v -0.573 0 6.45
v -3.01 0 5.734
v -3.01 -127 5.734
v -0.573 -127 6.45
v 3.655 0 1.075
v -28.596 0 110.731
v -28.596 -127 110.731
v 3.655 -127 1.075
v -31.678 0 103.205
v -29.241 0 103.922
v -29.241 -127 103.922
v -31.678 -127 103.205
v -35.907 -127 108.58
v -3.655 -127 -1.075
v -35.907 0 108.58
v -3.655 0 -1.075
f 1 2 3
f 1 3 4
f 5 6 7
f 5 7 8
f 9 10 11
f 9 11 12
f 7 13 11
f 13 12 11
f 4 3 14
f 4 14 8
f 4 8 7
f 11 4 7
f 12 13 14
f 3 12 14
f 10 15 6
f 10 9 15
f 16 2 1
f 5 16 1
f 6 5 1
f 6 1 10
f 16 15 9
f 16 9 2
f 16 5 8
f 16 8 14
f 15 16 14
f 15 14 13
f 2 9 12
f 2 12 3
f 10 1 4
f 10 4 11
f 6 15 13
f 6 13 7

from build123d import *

# Parameters (mm, degrees)
BOSS_EXTRUDE1_DEPTH = 127


with BuildPart() as part:
    # Sketch5 → Boss-Extrude1 (new body)
    with BuildSketch(Plane(origin=(0, 0, 0), x_dir=(1, 0, 0), z_dir=(0, 1, 0))):
        Polygon((-35.906793393, -108.580423135), (-28.596428271, -110.730530524), (3.655182561, -1.075053694), (-3.655182561, 1.075053694), align=None)
        Polygon((-3.010150344, -5.733619704), (-0.57336197, -6.450322166), (-29.241460488, -103.921857126), (-31.678248862, -103.205154663), align=None, mode=Mode.SUBTRACT)
    extrude(amount=-BOSS_EXTRUDE1_DEPTH)


solid = part.part
